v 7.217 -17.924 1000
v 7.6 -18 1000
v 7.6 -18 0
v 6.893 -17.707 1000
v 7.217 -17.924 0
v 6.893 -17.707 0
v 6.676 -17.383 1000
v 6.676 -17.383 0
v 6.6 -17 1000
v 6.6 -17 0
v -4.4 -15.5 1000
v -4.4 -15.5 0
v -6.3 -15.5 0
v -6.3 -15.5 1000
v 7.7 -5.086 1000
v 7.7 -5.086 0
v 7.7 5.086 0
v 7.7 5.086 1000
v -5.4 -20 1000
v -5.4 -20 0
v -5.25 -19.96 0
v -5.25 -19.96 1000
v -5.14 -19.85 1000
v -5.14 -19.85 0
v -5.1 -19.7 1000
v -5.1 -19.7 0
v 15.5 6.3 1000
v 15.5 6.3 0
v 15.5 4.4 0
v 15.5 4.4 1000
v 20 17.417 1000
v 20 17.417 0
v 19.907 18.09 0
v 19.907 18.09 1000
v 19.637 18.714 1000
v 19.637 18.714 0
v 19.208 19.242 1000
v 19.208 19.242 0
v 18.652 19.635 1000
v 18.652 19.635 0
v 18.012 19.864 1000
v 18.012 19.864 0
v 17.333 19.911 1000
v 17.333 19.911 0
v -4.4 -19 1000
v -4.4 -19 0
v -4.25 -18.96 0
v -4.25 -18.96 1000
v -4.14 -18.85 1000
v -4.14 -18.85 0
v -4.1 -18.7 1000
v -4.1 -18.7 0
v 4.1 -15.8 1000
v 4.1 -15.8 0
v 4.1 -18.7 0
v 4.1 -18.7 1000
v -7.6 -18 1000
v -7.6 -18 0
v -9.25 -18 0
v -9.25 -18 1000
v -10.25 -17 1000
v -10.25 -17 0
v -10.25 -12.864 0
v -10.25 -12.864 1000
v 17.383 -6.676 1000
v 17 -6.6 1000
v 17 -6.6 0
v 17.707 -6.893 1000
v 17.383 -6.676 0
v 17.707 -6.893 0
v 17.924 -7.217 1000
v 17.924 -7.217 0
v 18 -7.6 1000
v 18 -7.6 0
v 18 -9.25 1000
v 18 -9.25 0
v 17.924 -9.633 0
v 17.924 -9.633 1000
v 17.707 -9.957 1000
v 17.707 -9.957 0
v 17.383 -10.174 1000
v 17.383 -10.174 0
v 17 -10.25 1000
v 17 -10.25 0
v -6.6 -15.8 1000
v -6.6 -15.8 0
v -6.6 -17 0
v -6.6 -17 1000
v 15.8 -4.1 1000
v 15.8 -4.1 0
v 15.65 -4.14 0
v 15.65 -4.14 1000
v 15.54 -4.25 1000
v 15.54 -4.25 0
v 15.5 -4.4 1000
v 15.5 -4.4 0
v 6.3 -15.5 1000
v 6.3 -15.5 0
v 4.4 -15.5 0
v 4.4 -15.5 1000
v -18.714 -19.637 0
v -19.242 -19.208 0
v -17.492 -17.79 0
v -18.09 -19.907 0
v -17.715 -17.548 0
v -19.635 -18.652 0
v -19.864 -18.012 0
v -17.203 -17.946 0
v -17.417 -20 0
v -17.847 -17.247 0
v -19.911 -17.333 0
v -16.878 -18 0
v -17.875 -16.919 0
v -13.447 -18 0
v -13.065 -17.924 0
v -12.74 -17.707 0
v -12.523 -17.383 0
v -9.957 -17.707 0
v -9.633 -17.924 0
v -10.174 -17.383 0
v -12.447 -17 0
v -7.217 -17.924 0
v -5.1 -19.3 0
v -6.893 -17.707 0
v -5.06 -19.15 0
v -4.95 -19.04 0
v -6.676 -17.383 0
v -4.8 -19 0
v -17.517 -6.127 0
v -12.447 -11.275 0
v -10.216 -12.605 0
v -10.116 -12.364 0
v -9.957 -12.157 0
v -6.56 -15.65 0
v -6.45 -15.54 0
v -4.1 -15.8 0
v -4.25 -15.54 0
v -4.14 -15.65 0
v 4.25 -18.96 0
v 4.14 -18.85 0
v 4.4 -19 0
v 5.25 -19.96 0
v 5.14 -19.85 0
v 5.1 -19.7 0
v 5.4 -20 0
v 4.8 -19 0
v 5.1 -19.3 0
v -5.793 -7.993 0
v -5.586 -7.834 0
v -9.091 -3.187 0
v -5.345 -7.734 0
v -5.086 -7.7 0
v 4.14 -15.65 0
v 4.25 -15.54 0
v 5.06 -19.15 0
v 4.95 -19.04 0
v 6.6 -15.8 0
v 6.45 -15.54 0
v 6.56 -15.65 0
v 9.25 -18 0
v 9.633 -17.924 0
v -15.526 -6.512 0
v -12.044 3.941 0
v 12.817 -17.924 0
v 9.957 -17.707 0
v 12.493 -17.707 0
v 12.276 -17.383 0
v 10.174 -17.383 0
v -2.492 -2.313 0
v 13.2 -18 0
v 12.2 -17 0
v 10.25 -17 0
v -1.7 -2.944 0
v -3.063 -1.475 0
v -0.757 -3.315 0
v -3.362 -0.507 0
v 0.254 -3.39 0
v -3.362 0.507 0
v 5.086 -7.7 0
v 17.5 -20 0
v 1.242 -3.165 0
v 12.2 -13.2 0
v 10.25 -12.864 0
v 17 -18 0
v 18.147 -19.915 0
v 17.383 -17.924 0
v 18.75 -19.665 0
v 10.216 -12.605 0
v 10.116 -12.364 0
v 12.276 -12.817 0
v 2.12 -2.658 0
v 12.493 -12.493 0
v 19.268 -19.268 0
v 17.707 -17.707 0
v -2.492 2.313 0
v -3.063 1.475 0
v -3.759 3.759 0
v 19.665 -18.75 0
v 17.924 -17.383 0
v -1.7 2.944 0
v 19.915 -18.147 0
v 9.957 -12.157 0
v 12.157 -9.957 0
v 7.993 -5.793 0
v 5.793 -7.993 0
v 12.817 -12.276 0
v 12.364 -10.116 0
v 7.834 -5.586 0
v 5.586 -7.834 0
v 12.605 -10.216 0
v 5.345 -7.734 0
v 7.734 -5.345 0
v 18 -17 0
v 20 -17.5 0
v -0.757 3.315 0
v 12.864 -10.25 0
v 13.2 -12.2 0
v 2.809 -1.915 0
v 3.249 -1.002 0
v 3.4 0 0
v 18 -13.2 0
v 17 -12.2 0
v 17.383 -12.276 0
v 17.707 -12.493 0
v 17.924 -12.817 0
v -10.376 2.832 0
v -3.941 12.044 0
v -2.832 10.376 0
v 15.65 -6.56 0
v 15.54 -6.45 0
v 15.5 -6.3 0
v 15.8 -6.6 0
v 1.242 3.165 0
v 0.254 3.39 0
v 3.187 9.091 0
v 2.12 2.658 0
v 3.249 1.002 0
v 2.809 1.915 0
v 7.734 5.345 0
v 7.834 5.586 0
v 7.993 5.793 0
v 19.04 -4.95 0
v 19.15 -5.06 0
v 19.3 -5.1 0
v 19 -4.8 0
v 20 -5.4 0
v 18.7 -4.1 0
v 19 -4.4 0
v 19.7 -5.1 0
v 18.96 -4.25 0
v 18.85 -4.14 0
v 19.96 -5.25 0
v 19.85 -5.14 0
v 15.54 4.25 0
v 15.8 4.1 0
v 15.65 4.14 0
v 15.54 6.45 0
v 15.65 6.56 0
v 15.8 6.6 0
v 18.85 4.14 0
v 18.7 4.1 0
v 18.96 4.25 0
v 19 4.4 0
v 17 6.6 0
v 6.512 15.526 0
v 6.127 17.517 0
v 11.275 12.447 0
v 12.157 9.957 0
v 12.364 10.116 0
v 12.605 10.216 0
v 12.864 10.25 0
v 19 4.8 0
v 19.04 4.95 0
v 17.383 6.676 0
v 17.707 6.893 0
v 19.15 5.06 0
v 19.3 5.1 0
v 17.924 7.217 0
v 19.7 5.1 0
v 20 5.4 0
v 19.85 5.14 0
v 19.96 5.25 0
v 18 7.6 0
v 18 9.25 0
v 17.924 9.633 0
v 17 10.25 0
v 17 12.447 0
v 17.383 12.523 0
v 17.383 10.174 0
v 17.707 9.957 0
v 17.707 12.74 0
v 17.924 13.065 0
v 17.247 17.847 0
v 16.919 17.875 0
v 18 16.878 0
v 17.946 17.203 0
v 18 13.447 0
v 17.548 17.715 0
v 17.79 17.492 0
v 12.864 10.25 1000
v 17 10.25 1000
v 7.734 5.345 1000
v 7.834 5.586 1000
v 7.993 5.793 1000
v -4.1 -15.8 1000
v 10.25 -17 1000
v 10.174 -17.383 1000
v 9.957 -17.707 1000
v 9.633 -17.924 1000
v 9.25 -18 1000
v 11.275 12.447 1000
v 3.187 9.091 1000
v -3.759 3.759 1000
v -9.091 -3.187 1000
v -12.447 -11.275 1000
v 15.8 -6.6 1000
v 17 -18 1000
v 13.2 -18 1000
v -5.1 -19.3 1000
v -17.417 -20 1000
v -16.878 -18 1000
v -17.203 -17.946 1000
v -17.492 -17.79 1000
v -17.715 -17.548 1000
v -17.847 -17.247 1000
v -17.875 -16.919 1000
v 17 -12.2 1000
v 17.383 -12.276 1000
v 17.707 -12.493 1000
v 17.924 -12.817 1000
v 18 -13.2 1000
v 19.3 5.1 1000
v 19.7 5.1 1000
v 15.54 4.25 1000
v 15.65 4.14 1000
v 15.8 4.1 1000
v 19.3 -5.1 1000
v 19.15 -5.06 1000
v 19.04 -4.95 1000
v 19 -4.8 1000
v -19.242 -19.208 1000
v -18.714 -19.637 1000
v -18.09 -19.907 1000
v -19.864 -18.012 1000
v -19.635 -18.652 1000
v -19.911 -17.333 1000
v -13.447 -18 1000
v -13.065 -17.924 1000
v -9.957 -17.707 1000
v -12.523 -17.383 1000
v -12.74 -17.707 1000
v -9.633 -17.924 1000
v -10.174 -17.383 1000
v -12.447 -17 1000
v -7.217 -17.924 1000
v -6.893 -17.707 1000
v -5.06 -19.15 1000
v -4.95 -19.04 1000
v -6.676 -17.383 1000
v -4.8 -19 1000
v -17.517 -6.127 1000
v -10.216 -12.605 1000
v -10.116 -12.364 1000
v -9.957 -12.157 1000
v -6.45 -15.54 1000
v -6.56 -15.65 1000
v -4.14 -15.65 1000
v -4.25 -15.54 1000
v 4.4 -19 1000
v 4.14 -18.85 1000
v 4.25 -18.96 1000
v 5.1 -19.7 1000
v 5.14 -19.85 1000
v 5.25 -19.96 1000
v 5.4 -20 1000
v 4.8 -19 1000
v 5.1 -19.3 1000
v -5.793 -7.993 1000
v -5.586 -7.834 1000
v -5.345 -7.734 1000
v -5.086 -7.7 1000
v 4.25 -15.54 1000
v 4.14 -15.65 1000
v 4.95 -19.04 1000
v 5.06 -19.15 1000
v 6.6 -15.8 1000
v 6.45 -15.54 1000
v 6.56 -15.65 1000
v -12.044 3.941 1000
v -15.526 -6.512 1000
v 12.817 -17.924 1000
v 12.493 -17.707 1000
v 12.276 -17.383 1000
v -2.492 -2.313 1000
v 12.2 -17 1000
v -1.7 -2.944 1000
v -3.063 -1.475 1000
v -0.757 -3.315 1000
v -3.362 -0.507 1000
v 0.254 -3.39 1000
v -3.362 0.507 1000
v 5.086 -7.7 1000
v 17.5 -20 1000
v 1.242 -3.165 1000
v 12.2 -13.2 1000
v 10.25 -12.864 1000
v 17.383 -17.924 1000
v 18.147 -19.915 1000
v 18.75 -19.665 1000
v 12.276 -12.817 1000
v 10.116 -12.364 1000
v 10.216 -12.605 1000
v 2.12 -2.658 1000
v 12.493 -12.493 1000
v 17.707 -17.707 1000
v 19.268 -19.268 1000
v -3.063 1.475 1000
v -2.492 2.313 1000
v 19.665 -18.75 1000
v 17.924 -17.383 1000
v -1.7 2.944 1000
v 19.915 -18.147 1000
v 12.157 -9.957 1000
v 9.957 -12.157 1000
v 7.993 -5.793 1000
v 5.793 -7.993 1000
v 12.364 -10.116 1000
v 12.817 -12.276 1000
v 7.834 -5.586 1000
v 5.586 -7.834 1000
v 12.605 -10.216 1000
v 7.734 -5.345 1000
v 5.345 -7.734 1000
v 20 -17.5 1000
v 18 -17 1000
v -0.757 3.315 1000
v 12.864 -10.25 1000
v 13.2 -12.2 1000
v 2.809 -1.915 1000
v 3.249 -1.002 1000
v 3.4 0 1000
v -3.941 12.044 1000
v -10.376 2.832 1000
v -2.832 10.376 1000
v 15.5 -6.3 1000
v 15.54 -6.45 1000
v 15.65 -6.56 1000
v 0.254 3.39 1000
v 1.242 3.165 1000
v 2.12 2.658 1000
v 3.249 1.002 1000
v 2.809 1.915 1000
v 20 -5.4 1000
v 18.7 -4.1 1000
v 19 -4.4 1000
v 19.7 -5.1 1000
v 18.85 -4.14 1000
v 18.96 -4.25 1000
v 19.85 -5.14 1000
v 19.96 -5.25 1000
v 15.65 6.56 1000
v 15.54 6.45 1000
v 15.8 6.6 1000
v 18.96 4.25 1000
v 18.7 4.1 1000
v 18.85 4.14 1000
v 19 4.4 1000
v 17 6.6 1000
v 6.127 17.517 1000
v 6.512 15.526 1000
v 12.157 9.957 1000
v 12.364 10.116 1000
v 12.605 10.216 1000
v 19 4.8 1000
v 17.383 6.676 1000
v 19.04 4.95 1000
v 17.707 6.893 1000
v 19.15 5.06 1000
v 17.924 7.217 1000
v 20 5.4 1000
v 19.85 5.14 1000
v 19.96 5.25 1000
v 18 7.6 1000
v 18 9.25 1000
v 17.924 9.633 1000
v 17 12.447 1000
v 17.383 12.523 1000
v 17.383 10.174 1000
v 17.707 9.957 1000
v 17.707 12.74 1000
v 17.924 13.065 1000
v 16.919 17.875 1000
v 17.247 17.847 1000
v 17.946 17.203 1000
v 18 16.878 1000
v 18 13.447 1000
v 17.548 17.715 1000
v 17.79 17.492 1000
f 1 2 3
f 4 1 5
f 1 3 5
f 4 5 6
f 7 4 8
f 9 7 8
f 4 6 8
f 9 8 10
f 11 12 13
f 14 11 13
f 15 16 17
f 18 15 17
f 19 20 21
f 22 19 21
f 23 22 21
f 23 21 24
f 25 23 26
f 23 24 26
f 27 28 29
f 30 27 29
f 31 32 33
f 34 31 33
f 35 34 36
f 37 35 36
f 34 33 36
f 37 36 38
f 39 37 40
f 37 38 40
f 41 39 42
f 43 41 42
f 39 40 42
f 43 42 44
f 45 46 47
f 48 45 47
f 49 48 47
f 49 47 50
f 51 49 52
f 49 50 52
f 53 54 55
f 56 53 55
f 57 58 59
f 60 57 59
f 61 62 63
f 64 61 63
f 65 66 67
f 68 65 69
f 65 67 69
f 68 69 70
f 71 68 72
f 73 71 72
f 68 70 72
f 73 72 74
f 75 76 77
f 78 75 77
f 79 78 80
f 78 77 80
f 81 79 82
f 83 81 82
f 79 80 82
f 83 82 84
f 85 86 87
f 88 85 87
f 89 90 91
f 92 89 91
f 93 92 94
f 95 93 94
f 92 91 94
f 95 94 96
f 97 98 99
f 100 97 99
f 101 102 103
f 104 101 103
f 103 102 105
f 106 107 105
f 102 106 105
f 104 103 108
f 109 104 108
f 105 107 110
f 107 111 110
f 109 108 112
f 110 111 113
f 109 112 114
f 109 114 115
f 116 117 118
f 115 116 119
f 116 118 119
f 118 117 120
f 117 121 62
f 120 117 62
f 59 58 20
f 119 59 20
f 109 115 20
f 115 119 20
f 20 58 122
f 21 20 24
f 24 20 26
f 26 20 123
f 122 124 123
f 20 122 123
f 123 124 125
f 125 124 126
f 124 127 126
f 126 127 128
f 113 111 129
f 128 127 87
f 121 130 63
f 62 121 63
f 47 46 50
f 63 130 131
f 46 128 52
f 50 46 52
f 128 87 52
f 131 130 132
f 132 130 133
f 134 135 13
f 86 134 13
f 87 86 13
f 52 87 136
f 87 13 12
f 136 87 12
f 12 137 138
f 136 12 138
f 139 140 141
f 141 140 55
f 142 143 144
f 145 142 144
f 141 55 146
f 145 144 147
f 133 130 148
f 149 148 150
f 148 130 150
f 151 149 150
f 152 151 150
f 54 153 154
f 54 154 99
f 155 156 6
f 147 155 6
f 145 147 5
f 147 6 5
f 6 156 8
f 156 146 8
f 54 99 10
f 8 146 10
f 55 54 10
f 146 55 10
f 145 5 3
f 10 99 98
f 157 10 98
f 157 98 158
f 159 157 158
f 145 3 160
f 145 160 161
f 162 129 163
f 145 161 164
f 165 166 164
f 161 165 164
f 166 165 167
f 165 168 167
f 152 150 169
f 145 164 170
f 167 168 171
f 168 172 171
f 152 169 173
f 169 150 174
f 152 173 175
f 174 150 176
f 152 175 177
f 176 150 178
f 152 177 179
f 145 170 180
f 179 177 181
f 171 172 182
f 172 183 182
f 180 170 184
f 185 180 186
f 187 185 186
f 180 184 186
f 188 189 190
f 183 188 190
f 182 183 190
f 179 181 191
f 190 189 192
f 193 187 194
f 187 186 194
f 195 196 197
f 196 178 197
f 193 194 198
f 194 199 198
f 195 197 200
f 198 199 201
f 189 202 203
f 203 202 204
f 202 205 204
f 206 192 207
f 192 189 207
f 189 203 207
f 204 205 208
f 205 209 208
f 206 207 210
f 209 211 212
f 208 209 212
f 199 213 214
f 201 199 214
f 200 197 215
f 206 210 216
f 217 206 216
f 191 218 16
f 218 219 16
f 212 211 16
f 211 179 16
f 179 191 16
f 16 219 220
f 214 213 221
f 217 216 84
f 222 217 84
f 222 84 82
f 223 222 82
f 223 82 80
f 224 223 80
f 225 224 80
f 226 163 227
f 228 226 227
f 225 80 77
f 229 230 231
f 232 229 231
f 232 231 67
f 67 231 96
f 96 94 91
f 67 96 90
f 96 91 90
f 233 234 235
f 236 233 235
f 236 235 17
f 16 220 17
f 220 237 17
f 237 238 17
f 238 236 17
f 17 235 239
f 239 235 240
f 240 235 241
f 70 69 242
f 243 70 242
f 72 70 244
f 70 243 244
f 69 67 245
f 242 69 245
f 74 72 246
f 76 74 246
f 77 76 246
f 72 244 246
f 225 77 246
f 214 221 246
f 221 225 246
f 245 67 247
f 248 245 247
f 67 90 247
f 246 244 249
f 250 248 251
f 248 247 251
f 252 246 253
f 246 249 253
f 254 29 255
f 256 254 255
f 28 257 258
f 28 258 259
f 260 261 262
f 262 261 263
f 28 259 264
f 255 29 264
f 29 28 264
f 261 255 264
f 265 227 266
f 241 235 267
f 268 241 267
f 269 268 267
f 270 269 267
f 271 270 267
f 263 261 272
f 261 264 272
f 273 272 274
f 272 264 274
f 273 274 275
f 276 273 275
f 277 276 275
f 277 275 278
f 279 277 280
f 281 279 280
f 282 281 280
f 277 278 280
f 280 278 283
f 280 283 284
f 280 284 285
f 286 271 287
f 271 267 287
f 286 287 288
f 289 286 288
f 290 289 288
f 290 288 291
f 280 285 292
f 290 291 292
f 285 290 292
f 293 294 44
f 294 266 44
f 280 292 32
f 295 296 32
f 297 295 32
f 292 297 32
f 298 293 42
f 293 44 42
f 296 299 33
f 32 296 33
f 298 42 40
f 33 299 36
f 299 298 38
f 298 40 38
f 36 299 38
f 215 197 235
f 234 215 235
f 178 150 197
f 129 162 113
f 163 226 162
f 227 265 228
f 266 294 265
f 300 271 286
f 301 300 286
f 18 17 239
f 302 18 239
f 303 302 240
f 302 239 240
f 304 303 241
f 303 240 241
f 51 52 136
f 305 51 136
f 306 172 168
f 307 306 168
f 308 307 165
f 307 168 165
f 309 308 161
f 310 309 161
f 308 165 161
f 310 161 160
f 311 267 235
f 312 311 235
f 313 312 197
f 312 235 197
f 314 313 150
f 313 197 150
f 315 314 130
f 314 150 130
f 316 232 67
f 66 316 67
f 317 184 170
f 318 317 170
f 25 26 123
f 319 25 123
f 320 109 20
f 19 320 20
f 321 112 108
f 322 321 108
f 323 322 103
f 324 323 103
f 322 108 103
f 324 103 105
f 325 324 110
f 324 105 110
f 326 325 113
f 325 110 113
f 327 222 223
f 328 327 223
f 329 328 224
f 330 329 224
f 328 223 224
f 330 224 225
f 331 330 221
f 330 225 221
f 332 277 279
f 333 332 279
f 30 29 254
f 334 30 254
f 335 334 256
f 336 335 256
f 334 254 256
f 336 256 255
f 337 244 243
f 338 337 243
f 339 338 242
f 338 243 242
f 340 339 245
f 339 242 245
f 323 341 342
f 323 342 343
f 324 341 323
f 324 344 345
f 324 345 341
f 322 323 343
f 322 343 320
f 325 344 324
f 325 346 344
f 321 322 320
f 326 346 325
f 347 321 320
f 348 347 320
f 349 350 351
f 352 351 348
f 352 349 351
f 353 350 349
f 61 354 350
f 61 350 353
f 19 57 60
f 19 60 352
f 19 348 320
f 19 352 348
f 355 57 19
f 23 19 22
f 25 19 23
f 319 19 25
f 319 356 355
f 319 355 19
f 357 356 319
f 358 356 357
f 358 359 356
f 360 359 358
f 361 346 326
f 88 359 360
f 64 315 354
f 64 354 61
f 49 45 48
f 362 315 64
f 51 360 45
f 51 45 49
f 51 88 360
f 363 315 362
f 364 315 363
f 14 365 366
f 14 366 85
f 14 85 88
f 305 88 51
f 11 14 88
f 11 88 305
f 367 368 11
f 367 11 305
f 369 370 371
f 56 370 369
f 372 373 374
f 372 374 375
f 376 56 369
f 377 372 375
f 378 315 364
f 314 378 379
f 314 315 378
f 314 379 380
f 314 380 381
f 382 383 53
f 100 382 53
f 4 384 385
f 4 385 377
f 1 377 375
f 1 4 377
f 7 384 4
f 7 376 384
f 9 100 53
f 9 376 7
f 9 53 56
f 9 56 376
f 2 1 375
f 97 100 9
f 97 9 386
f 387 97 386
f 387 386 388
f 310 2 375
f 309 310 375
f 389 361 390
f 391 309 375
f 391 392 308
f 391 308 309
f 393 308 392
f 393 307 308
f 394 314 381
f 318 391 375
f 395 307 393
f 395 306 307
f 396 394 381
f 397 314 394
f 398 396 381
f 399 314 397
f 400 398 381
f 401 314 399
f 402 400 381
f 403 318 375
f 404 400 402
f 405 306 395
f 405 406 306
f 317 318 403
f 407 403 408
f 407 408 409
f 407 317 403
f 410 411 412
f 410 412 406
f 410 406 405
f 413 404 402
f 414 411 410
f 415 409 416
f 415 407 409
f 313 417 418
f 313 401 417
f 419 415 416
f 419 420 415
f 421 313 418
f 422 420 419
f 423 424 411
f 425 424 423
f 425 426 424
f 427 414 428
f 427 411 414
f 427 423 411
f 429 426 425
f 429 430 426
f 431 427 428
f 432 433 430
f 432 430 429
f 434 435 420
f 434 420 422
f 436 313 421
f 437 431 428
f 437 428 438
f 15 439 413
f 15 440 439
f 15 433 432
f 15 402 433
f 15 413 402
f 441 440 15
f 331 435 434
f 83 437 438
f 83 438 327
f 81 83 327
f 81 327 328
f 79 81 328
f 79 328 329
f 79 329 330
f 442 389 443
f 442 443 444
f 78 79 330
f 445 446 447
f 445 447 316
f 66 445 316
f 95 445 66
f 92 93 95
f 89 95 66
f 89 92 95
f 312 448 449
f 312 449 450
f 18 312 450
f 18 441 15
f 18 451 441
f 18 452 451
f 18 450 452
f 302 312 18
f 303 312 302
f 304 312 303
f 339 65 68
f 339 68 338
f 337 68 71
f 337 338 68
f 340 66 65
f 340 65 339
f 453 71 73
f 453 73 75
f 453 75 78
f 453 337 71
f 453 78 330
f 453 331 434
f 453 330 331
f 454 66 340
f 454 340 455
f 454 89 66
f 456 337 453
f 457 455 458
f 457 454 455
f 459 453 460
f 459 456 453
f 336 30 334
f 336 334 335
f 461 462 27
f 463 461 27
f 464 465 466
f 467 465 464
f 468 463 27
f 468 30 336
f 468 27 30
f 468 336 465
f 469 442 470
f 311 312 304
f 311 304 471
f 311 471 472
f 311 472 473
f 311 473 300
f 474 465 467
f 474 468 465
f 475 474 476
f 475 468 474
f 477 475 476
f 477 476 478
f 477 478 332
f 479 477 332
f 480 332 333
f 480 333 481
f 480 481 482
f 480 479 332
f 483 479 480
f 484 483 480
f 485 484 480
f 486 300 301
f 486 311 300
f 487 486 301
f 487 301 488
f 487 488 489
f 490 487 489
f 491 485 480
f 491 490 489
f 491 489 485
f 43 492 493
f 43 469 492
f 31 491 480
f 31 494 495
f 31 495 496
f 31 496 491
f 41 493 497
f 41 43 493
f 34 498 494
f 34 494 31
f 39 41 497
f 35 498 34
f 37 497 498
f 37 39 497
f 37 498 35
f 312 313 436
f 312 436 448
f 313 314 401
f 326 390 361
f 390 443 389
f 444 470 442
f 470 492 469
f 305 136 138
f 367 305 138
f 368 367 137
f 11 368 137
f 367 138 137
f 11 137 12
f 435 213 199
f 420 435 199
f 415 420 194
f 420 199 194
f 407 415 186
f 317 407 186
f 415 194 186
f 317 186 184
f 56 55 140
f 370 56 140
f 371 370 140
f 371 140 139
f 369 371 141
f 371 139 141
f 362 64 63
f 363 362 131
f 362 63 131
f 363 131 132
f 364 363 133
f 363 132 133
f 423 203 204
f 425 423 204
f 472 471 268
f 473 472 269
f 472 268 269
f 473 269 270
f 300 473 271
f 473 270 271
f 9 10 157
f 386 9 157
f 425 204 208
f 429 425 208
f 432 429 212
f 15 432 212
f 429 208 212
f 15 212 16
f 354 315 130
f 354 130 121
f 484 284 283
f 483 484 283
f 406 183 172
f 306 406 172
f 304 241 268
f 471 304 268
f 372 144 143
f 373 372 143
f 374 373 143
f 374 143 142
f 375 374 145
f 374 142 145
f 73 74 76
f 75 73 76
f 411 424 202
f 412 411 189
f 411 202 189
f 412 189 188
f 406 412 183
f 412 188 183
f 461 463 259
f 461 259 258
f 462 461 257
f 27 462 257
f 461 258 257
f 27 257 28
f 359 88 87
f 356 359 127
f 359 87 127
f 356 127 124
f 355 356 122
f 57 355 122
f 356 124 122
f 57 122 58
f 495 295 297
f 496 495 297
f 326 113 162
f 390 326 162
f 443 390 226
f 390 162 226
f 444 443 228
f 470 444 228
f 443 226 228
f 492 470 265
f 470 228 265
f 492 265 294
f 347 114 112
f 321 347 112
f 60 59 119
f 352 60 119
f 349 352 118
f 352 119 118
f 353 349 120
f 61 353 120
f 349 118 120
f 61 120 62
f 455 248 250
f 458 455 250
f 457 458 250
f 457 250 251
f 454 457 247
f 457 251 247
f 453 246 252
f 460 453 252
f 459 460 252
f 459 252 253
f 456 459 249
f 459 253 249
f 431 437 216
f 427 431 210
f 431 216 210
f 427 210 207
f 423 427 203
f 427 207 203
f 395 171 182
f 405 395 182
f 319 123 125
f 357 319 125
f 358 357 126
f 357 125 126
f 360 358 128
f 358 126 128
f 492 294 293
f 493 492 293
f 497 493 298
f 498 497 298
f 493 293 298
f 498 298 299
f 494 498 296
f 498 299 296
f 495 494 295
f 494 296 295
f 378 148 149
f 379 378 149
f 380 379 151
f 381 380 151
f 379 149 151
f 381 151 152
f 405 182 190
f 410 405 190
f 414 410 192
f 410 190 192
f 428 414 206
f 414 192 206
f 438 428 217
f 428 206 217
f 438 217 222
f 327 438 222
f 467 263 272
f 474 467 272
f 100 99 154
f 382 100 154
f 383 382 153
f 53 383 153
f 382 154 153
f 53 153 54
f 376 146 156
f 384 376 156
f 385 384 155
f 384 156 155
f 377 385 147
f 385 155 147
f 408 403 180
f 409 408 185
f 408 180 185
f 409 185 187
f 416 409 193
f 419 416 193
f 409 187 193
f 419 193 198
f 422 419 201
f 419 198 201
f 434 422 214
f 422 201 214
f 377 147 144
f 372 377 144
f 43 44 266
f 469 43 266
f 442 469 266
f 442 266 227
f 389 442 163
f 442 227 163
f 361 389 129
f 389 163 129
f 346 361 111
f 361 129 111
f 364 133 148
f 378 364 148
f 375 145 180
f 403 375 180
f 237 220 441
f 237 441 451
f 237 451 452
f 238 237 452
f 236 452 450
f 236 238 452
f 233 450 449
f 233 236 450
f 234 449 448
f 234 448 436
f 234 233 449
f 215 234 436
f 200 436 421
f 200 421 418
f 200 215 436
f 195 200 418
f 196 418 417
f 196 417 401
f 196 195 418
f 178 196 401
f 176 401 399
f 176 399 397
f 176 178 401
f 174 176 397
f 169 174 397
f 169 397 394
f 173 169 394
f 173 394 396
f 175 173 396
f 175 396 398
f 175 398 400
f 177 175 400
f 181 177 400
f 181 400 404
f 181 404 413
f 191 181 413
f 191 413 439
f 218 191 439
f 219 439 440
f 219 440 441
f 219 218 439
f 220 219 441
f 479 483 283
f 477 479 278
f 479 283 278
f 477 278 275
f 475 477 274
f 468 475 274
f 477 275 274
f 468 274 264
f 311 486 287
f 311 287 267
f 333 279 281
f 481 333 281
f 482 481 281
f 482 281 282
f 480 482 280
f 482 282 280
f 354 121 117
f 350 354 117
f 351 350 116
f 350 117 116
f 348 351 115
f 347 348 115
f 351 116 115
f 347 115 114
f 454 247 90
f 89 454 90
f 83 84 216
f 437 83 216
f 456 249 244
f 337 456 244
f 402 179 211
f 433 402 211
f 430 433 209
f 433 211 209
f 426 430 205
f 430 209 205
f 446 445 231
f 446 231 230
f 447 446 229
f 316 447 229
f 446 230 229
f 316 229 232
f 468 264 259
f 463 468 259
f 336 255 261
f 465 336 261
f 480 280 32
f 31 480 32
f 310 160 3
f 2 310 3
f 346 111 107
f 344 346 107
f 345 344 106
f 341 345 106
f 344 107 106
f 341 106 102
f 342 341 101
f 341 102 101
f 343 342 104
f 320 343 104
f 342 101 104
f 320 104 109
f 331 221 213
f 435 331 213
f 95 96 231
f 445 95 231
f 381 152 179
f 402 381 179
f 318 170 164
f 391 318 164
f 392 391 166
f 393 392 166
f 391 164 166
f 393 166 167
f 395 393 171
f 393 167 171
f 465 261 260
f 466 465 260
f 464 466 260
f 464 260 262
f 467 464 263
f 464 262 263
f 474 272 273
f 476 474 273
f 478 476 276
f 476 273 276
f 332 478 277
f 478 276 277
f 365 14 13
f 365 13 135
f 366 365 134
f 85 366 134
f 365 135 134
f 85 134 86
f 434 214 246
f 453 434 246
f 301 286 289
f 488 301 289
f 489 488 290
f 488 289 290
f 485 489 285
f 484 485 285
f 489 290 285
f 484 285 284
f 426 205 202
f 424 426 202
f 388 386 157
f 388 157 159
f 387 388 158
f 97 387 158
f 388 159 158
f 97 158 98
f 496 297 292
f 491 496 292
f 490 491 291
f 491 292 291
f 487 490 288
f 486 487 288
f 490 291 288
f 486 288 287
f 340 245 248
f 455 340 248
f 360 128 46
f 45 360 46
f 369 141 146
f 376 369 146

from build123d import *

# Parameters (mm, degrees)
SKETCH_1_R      = 3.4
EXTRUDE_1_DEPTH = 1000


with BuildPart() as part:
    # Эскиз1 → Бобышка-Вытянуть1 (new body)
    with BuildSketch(Plane.XY):
        with BuildLine():
            Line((10.25, -20), (17.5, -20))
            ThreePointArc((17.5, -20), (19.267766953, -19.267766953), (20, -17.5))
            Line((20, -17.5), (20, -10.25))
            Line((20, -10.25), (20, -5.4))
            ThreePointArc((20, -5.4), (19.912132034, -5.187867966), (19.7, -5.1))
            Line((19.7, -5.1), (19.3, -5.1))
            ThreePointArc((19.3, -5.1), (19.087867966, -5.012132034), (19, -4.8))
            Line((19, -4.8), (19, -4.4))
            ThreePointArc((19, -4.4), (18.912132034, -4.187867966), (18.7, -4.1))
            Line((18.7, -4.1), (15.8, -4.1))
            ThreePointArc((15.8, -4.1), (15.587867966, -4.187867966), (15.5, -4.4))
            Line((15.5, -4.4), (15.5, -6.3))
            ThreePointArc((15.5, -6.3), (15.587867966, -6.512132034), (15.8, -6.6))
            Line((15.8, -6.6), (17, -6.6))
            ThreePointArc((17, -6.6), (17.707106781, -6.892893219), (18, -7.6))
            Line((18, -7.6), (18, -9.25))
            ThreePointArc((18, -9.25), (17.707106781, -9.957106781), (17, -10.25))
            Line((17, -10.25), (12.864213562, -10.25))
            ThreePointArc((12.864213562, -10.25), (12.48153013, -10.173879533), (12.157106781, -9.957106781))
            Line((12.157106781, -9.957106781), (7.992893219, -5.792893219))
            ThreePointArc((7.992893219, -5.792893219), (7.776120467, -5.46846987), (7.7, -5.085786438))
            Line((7.7, -5.085786438), (7.7, 5.085786438))
            ThreePointArc((7.7, 5.085786438), (7.776120467, 5.46846987), (7.992893219, 5.792893219))
            Line((7.992893219, 5.792893219), (12.157106781, 9.957106781))
            ThreePointArc((12.157106781, 9.957106781), (12.48153013, 10.173879533), (12.864213562, 10.25))
            Line((12.864213562, 10.25), (17, 10.25))
            ThreePointArc((17, 10.25), (17.707106781, 9.957106781), (18, 9.25))
            Line((18, 9.25), (18, 7.6))
            ThreePointArc((18, 7.6), (17.707106781, 6.892893219), (17, 6.6))
            Line((17, 6.6), (15.8, 6.6))
            ThreePointArc((15.8, 6.6), (15.587867966, 6.512132034), (15.5, 6.3))
            Line((15.5, 6.3), (15.5, 4.4))
            ThreePointArc((15.5, 4.4), (15.587867966, 4.187867966), (15.8, 4.1))
            Line((15.8, 4.1), (18.7, 4.1))
            ThreePointArc((18.7, 4.1), (18.912132034, 4.187867966), (19, 4.4))
            Line((19, 4.4), (19, 4.8))
            ThreePointArc((19, 4.8), (19.087867966, 5.012132034), (19.3, 5.1))
            Line((19.3, 5.1), (19.7, 5.1))
            ThreePointArc((19.7, 5.1), (19.912132034, 5.187867966), (20, 5.4))
            Line((20, 5.4), (20, 10.25))
            Line((20, 10.25), (20, 17.416573868))
            ThreePointArc((20, 17.416573868), (19.207825128, 19.242315726), (17.333333333, 19.911012126))
            ThreePointArc((17.333333333, 19.911012126), (-8.284271247, 8.284271247), (-19.911012126, -17.333333333))
            ThreePointArc((-19.911012126, -17.333333333), (-19.242315726, -19.207825128), (-17.416573868, -20))
            Line((-17.416573868, -20), (-10.25, -20))
            Line((-10.25, -20), (-5.4, -20))
            ThreePointArc((-5.4, -20), (-5.187867966, -19.912132034), (-5.1, -19.7))
            Line((-5.1, -19.7), (-5.1, -19.3))
            ThreePointArc((-5.1, -19.3), (-5.012132034, -19.087867966), (-4.8, -19))
            Line((-4.8, -19), (-4.4, -19))
            ThreePointArc((-4.4, -19), (-4.187867966, -18.912132034), (-4.1, -18.7))
            Line((-4.1, -18.7), (-4.1, -15.8))
            ThreePointArc((-4.1, -15.8), (-4.187867966, -15.587867966), (-4.4, -15.5))
            Line((-4.4, -15.5), (-6.3, -15.5))
            ThreePointArc((-6.3, -15.5), (-6.512132034, -15.587867966), (-6.6, -15.8))
            Line((-6.6, -15.8), (-6.6, -17))
            ThreePointArc((-6.6, -17), (-6.892893219, -17.707106781), (-7.6, -18))
            Line((-7.6, -18), (-9.25, -18))
            ThreePointArc((-9.25, -18), (-9.957106781, -17.707106781), (-10.25, -17))
            Line((-10.25, -17), (-10.25, -12.864213562))
            ThreePointArc((-10.25, -12.864213562), (-10.173879533, -12.48153013), (-9.957106781, -12.157106781))
            Line((-9.957106781, -12.157106781), (-5.792893219, -7.992893219))
            ThreePointArc((-5.792893219, -7.992893219), (-5.46846987, -7.776120467), (-5.085786438, -7.7))
            Line((-5.085786438, -7.7), (5.085786438, -7.7))
            ThreePointArc((5.085786438, -7.7), (5.46846987, -7.776120467), (5.792893219, -7.992893219))
            Line((5.792893219, -7.992893219), (9.957106781, -12.157106781))
            ThreePointArc((9.957106781, -12.157106781), (10.173879533, -12.48153013), (10.25, -12.864213562))
            Line((10.25, -12.864213562), (10.25, -17))
            ThreePointArc((10.25, -17), (9.957106781, -17.707106781), (9.25, -18))
            Line((9.25, -18), (7.6, -18))
            ThreePointArc((7.6, -18), (6.892893219, -17.707106781), (6.6, -17))
            Line((6.6, -17), (6.6, -15.8))
            ThreePointArc((6.6, -15.8), (6.512132034, -15.587867966), (6.3, -15.5))
            Line((6.3, -15.5), (4.4, -15.5))
            ThreePointArc((4.4, -15.5), (4.187867966, -15.587867966), (4.1, -15.8))
            Line((4.1, -15.8), (4.1, -18.7))
            ThreePointArc((4.1, -18.7), (4.187867966, -18.912132034), (4.4, -19))
            Line((4.4, -19), (4.8, -19))
            ThreePointArc((4.8, -19), (5.012132034, -19.087867966), (5.1, -19.3))
            Line((5.1, -19.3), (5.1, -19.7))
            ThreePointArc((5.1, -19.7), (5.187867966, -19.912132034), (5.4, -20))
            Line((5.4, -20), (10.25, -20))
        make_face()
        Circle(SKETCH_1_R, mode=Mode.SUBTRACT)
        with BuildLine():
            Line((18, 16.878177829), (18, 13.447331922))
            ThreePointArc((18, 13.447331922), (17.707106781, 12.740225141), (17, 12.447331922))
            Line((17, 12.447331922), (11.274711974, 12.447331922))
            ThreePointArc((11.274711974, 12.447331922), (-3.758787848, 3.758787848), (-12.447331922, -11.274711974))
            Line((-12.447331922, -11.274711974), (-12.447331922, -17))
            ThreePointArc((-12.447331922, -17), (-12.740225141, -17.707106781), (-13.447331922, -18))
            Line((-13.447331922, -18), (-16.878177829, -18))
            ThreePointArc((-16.878177829, -18), (-17.613392451, -17.677834389), (-17.874885338, -16.918918919))
            ThreePointArc((-17.874885338, -16.918918919), (-6.870057685, 6.870057685), (16.918918919, 17.874885338))
            ThreePointArc((16.918918919, 17.874885338), (17.677834389, 17.613392451), (18, 16.878177829))
        make_face(mode=Mode.SUBTRACT)
        with BuildLine():
            Line((13.2, -12.2), (17, -12.2))
            ThreePointArc((17, -12.2), (17.707106781, -12.492893219), (18, -13.2))
            Line((18, -13.2), (18, -17))
            ThreePointArc((18, -17), (17.707106781, -17.707106781), (17, -18))
            Line((17, -18), (13.2, -18))
            ThreePointArc((13.2, -18), (12.492893219, -17.707106781), (12.2, -17))
            Line((12.2, -17), (12.2, -13.2))
            ThreePointArc((12.2, -13.2), (12.492893219, -12.492893219), (13.2, -12.2))
        make_face(mode=Mode.SUBTRACT)
    extrude(amount=EXTRUDE_1_DEPTH)


solid = part.part
